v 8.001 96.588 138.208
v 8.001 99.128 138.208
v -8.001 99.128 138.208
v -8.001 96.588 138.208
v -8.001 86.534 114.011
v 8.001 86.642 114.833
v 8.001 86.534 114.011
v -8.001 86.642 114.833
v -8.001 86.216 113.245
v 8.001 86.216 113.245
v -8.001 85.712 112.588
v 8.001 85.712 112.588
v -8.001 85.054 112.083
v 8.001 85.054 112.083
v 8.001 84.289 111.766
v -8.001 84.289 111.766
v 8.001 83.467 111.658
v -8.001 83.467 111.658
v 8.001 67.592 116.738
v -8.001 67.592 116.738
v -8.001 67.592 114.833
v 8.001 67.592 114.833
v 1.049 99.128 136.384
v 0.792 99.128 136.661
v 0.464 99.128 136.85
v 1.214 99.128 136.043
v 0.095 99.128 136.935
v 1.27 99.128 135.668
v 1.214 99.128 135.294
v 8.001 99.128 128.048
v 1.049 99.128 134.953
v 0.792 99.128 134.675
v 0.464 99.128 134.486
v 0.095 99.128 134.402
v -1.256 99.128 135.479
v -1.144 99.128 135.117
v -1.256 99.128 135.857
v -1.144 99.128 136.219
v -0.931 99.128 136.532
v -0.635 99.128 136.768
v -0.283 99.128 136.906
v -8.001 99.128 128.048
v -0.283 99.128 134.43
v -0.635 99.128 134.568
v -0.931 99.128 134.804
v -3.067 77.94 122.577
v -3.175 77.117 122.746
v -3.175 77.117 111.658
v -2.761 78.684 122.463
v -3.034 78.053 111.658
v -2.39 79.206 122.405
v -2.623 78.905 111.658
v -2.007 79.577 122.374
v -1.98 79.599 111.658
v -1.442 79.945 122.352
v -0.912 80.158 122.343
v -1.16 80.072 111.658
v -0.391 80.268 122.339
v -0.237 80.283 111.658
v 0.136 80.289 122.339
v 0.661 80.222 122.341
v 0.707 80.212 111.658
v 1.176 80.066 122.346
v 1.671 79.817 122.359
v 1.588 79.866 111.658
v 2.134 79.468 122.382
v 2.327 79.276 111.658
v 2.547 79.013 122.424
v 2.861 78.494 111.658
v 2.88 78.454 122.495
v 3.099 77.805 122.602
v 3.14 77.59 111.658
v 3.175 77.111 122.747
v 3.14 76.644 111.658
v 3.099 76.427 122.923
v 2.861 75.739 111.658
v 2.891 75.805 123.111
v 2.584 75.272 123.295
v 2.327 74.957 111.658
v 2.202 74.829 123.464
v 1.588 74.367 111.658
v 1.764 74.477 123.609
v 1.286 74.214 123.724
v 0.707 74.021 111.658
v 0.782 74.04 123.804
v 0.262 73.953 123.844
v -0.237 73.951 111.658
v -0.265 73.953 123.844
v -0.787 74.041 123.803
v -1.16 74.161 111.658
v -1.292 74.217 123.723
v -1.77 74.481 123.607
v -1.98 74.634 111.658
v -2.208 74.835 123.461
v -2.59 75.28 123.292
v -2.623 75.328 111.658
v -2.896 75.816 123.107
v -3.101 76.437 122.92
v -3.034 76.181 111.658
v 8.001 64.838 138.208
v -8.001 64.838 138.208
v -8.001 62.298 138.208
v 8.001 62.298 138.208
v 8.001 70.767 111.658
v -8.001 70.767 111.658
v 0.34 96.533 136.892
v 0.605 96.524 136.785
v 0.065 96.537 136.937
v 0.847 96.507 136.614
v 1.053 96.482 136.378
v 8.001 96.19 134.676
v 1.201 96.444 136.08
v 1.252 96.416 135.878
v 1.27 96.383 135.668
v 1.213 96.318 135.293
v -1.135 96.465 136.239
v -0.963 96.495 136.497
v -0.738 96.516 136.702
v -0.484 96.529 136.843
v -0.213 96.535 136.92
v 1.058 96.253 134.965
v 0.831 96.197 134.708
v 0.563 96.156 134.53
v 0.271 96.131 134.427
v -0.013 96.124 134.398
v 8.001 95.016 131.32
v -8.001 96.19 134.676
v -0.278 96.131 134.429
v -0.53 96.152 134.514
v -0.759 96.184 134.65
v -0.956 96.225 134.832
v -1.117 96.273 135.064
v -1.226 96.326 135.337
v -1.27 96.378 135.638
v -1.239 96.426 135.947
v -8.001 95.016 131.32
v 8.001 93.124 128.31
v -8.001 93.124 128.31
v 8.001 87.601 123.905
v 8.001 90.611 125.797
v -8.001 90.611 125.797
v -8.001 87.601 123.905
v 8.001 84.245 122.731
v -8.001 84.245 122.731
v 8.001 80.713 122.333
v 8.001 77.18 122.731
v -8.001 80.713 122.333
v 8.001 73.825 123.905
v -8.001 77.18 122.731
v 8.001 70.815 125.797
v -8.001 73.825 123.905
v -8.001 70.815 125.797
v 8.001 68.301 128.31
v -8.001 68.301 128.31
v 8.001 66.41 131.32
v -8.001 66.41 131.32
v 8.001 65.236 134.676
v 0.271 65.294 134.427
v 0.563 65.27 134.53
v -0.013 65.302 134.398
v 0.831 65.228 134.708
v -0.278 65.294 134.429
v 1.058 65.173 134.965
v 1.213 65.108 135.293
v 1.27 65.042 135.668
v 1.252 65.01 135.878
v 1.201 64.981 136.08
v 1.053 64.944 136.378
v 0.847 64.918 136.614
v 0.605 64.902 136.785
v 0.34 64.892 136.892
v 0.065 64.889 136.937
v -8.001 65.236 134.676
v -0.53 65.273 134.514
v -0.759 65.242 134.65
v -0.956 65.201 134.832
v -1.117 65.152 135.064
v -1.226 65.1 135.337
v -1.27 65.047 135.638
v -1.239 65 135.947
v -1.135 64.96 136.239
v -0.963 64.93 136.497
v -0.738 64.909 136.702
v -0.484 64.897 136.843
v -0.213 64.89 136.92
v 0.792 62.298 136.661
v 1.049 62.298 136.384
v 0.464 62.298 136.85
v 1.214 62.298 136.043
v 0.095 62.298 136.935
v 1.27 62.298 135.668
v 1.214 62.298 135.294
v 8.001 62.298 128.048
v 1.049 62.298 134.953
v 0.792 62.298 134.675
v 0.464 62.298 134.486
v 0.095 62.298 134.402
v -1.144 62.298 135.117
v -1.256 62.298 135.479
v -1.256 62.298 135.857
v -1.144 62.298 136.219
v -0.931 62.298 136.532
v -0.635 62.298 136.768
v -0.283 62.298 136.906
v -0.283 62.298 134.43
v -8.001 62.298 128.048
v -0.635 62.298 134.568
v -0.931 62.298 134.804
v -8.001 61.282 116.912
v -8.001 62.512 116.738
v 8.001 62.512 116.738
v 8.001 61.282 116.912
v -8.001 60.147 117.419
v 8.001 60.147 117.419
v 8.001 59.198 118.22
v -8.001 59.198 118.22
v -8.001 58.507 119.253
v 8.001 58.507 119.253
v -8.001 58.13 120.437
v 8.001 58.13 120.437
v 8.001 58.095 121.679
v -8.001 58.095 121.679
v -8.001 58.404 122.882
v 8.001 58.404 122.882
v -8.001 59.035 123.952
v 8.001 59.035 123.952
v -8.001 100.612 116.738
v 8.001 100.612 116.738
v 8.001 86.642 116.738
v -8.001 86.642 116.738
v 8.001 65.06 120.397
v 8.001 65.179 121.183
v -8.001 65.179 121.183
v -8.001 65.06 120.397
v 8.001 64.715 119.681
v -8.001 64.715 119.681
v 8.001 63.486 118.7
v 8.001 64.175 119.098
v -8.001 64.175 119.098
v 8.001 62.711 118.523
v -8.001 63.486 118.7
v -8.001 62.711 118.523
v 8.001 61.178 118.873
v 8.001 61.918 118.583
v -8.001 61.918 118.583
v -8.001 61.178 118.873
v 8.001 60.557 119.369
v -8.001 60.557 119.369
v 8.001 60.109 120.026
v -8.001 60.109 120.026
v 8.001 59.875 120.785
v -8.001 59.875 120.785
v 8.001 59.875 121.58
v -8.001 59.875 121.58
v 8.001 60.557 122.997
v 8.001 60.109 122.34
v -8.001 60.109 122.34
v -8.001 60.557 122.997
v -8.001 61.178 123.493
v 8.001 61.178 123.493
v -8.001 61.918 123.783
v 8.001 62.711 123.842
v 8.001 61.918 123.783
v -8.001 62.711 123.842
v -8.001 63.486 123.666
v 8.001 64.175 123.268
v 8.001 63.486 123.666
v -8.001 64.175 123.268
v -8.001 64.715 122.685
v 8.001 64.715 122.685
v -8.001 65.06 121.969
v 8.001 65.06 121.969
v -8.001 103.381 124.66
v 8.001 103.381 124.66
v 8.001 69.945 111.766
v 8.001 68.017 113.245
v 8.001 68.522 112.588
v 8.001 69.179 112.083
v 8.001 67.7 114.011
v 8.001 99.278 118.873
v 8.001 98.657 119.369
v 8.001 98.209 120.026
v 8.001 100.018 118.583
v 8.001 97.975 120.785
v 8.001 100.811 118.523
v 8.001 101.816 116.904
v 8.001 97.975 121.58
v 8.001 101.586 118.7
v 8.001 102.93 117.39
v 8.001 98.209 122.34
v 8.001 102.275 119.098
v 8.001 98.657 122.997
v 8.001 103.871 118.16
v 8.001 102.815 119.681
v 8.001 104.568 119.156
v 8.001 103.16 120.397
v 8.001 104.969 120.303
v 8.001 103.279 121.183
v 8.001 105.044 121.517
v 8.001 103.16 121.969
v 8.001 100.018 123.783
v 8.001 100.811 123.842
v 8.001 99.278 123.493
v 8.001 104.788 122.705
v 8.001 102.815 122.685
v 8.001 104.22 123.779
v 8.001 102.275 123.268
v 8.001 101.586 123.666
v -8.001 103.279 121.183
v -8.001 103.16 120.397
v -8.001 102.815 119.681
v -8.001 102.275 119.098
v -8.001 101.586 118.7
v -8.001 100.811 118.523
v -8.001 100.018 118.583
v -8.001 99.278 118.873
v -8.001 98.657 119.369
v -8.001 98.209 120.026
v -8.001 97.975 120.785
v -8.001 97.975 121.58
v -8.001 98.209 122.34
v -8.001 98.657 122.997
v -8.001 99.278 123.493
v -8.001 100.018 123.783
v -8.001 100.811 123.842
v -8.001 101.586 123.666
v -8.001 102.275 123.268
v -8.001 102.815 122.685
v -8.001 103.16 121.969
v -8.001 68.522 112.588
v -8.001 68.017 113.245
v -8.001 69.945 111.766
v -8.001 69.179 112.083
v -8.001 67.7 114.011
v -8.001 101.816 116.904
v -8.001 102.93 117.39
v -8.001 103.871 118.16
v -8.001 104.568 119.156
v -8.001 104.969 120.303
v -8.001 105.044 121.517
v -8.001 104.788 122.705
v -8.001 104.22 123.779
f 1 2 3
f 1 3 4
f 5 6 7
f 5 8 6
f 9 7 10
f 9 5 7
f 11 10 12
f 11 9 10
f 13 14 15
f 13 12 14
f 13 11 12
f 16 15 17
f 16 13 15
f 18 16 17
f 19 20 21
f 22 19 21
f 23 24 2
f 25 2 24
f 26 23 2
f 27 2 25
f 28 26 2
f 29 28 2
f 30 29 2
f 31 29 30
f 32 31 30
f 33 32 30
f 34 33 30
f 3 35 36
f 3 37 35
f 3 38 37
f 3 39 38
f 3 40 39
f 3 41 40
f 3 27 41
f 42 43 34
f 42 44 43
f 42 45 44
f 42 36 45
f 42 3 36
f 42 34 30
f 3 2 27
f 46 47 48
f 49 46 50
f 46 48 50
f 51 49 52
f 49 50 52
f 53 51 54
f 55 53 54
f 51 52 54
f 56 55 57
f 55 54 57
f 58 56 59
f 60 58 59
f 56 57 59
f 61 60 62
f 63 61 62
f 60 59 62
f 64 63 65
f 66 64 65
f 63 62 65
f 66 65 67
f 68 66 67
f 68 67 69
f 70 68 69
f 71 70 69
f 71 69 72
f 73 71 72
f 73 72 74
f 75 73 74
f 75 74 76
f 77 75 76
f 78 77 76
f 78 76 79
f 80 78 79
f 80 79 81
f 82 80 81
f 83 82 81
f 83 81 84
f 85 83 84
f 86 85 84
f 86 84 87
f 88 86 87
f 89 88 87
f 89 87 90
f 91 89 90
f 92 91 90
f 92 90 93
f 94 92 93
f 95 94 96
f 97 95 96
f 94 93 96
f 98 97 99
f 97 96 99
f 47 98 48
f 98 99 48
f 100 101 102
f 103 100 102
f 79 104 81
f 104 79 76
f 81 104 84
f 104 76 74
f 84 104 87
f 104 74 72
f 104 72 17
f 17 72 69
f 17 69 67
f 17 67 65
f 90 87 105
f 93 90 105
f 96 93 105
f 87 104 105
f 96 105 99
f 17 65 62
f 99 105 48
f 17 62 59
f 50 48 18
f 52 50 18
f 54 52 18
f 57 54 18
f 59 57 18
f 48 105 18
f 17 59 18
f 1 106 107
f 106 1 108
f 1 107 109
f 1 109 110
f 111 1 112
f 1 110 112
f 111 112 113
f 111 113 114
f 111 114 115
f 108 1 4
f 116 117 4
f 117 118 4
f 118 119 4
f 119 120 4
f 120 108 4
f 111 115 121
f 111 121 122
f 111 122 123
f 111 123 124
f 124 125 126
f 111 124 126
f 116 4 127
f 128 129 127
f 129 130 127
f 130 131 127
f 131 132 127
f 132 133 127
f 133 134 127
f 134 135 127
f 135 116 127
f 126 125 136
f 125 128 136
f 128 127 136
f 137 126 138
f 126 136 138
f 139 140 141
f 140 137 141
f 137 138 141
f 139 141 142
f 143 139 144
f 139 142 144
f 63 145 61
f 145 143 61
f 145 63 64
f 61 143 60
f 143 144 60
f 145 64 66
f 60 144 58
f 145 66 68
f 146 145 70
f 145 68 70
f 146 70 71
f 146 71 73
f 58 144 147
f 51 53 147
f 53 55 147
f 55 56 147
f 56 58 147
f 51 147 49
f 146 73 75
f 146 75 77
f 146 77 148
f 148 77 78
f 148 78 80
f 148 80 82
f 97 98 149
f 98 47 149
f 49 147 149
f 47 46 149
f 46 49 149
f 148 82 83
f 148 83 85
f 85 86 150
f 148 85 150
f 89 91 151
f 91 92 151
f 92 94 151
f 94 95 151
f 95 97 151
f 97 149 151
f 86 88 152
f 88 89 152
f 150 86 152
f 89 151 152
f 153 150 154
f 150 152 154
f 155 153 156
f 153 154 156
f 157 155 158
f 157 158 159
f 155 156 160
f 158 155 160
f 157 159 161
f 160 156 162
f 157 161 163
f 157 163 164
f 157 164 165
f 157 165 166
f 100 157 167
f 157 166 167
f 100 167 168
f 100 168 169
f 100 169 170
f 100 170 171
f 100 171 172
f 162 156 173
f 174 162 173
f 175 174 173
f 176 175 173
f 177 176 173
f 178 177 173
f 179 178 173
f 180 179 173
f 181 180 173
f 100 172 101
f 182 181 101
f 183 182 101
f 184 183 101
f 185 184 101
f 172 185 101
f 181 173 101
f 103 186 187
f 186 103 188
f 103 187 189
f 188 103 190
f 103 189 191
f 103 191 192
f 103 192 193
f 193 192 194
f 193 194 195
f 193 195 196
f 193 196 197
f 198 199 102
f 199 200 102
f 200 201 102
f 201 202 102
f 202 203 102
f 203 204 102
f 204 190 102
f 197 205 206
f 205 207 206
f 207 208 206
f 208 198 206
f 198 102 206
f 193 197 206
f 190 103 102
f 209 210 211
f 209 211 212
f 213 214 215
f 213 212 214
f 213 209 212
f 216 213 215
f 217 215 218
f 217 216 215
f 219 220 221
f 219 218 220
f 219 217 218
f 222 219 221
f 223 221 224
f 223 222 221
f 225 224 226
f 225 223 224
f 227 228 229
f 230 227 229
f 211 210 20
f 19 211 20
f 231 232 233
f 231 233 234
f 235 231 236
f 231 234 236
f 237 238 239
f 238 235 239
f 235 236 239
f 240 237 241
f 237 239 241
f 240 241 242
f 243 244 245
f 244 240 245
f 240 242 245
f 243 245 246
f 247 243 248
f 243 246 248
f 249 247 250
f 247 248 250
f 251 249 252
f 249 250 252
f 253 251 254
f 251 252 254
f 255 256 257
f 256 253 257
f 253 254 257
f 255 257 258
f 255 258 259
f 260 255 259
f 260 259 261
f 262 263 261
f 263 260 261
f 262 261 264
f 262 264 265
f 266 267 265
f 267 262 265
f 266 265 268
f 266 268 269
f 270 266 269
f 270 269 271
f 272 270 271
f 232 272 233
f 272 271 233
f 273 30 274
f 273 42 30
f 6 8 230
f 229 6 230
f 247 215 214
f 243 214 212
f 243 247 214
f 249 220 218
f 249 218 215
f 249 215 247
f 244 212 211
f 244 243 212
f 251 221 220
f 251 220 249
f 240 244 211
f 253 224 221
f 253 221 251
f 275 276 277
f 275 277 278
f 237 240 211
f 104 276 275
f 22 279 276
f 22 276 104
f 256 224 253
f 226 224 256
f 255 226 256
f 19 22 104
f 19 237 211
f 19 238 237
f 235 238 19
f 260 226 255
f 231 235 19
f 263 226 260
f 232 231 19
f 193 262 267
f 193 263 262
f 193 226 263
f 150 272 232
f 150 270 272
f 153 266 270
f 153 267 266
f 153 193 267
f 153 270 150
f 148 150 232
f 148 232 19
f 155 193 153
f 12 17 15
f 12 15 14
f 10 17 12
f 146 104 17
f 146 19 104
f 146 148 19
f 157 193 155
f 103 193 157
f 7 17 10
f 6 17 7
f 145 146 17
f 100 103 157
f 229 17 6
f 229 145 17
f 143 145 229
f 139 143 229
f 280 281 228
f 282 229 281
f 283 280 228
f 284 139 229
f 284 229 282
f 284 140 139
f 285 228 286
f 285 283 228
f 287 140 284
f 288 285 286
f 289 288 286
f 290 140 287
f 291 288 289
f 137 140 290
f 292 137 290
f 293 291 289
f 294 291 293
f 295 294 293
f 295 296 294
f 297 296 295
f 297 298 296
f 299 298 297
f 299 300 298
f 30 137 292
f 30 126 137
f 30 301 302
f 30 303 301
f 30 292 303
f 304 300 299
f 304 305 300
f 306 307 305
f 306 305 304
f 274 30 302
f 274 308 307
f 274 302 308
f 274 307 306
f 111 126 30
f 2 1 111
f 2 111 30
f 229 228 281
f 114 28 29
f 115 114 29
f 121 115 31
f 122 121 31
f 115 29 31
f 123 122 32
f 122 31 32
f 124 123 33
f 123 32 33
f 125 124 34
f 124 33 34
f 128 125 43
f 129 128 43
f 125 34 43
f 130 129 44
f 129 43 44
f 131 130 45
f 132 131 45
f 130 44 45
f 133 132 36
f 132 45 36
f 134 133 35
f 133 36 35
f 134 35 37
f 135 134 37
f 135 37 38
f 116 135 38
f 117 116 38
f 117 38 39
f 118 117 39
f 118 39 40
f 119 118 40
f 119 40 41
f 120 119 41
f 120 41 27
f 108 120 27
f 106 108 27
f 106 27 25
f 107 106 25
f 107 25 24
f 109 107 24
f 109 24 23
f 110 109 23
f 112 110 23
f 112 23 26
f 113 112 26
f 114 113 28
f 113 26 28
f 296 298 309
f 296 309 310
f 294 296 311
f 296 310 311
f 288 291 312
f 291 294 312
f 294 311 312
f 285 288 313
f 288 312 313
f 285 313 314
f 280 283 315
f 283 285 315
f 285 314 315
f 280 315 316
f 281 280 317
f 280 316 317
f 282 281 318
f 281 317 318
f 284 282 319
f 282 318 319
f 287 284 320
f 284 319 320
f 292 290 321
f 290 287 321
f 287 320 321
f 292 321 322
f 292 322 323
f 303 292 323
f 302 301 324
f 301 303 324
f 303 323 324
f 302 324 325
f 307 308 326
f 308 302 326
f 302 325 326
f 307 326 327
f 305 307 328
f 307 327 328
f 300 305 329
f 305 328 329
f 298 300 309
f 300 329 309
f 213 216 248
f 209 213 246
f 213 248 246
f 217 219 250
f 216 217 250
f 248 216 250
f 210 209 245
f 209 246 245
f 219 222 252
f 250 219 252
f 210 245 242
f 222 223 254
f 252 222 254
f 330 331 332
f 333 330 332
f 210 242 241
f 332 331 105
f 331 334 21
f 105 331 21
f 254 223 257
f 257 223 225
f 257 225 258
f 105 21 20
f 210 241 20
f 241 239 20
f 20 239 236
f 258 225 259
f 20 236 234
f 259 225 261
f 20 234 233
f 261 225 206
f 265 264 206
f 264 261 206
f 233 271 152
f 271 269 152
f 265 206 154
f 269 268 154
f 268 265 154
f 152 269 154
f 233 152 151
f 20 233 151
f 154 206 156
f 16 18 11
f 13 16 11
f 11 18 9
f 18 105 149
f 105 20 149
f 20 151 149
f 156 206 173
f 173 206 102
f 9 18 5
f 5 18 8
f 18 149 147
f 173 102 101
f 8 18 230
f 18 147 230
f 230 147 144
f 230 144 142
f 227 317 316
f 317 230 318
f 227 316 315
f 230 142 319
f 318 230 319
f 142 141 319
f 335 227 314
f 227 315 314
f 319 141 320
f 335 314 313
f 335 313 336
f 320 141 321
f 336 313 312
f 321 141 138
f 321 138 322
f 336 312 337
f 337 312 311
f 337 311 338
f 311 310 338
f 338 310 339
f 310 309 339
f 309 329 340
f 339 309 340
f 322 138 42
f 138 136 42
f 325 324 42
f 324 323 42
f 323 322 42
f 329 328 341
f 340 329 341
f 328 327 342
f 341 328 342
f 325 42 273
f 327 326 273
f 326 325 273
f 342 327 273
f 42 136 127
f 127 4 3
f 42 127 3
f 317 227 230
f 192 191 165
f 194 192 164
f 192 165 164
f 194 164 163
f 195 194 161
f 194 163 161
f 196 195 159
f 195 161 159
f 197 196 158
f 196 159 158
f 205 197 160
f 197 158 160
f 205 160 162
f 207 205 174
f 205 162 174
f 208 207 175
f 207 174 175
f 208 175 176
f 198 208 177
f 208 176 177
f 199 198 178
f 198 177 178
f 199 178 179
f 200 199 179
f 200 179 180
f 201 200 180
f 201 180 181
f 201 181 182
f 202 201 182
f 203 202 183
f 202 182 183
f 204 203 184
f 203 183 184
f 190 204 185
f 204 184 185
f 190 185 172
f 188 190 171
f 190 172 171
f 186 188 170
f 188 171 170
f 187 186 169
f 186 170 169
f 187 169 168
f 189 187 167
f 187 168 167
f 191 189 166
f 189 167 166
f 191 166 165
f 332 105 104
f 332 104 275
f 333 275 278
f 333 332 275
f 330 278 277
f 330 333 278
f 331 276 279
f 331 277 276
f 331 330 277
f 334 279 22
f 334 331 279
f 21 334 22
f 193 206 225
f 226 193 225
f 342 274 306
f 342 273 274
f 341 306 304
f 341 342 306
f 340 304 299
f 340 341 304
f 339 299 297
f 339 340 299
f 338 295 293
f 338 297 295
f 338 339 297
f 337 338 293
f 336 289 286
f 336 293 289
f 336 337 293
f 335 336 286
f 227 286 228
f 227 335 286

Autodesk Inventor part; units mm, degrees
ref_plane "YZ Plane" through (0, 0, 0) normal (1, 0, 0) x (0, 1, 0)
ref_plane "XZ Plane" through (0, 0, 0) normal (0, 1, 0) x (-1, 0, 0)
ref_plane "XY Plane" through (0, 0, 0) normal (0, 0, 1) x (1, 0, 0)
sketch "Sketch2" plane through (0, 0, 0) normal (1, 0, 0) x (0, 1, 0)
  circle A0 centre (100.6118, 121.1829) radius 2.667
  circle A1 centre (62.5118, 121.1829) radius 2.667
  line L0 (100.6118, 121.1829) -> (62.5118, 121.1829) construction
  arc A2 (100.6118, 116.7379) -> (103.3814, 124.6597) centre (100.6118, 121.1829) ccw
  arc A3 (59.0351, 123.9525) -> (62.5118, 116.7379) centre (62.5118, 121.1829) ccw
  line L1 (100.6118, 116.7379) -> (86.6418, 116.7379)
  line L2 (62.5118, 116.7379) -> (67.5918, 116.7379)
  line L3 (67.5918, 116.7379) -> (67.5918, 114.8329)
  line L4 (70.7668, 111.6579) -> (83.4668, 111.6579)
  line L5 (86.6418, 114.8329) -> (86.6418, 116.7379)
  arc A4 (64.8377, 138.2082) -> (96.5877, 138.2082) centre (80.7127, 138.2082) ccw
  line L6 (77.1168, 111.6579) -> (77.1168, 163.1454) construction
  line L7 (99.1277, 138.2082) -> (96.5877, 138.2082)
  line L8 (64.8377, 138.2082) -> (62.2977, 138.2082)
  line L9 (99.1277, 138.2082) -> (99.1277, 128.0482)
  line L10 (99.1277, 128.0482) -> (103.3814, 124.6597)
  line L11 (62.2977, 138.2082) -> (62.2977, 128.0482)
  line L12 (62.2977, 128.0482) -> (59.0351, 123.9525)
  line L13 (99.1277, 128.0482) -> (62.2977, 128.0482) construction
  arc A5 (83.4668, 111.6579) -> (86.6418, 114.8329) centre (83.4668, 114.8329) ccw
  arc A6 (67.5918, 114.8329) -> (70.7668, 111.6579) centre (70.7668, 114.8329) ccw
  point P0 (0, 0)
  point P1 (67.5918, 111.6579)
  point P2 (86.6418, 111.6579)
  dimension "d0" = 5.334
  dimension "d1" = 5.334
  dimension "d2" = 38.1
  dimension "d3" = 8.89
  dimension "d4" = 8.89
  dimension "d7" = 31.75
  dimension "d8" = 9.525
  dimension "d9" = 13.97
  dimension "d10" = 5.08
  dimension "d11" = 2.54
  dimension "d12" = 2.54
  dimension "d13" = 10.16
  dimension "d24" = 3.175
extrude "Extrusion1" add sketch "Sketch2" along normal mid plane 16.002
sketch "Sketch3" plane through (-8.001, 99.1277, 128.0482) normal (0, 1, 0) x (1, 0, 0)
  line L0 (0, 0) -> (0, -10.16) projected
  line L1 (0, -10.16) -> (16.002, -10.16) projected
  circle A0 centre (8.001, -7.62) radius 1.27
  point P0 (8.001, 128.0482)
  dimension "d16" = 2.54
  dimension "d17" = 8.001
  dimension "d18" = 2.54
extrude "Extrusion2" cut sketch "Sketch3" against normal up to surface (36.83 mm away)
sketch "Sketch6" plane through (8.001, 70.7668, 111.6579) normal (0, 0, -1) x (-1, 0, 0)
  circle A0 centre (8.001, 6.35) radius 3.175
  line L0 (0, 0) -> (16.002, 12.7) construction
  point P0 (8.001, -70.7668)
  dimension "d25" = 6.35
extrude "Extrusion4" cut sketch "Sketch6" against normal blind 25.4
properties part number "Axle Housing - Front - Custom"
